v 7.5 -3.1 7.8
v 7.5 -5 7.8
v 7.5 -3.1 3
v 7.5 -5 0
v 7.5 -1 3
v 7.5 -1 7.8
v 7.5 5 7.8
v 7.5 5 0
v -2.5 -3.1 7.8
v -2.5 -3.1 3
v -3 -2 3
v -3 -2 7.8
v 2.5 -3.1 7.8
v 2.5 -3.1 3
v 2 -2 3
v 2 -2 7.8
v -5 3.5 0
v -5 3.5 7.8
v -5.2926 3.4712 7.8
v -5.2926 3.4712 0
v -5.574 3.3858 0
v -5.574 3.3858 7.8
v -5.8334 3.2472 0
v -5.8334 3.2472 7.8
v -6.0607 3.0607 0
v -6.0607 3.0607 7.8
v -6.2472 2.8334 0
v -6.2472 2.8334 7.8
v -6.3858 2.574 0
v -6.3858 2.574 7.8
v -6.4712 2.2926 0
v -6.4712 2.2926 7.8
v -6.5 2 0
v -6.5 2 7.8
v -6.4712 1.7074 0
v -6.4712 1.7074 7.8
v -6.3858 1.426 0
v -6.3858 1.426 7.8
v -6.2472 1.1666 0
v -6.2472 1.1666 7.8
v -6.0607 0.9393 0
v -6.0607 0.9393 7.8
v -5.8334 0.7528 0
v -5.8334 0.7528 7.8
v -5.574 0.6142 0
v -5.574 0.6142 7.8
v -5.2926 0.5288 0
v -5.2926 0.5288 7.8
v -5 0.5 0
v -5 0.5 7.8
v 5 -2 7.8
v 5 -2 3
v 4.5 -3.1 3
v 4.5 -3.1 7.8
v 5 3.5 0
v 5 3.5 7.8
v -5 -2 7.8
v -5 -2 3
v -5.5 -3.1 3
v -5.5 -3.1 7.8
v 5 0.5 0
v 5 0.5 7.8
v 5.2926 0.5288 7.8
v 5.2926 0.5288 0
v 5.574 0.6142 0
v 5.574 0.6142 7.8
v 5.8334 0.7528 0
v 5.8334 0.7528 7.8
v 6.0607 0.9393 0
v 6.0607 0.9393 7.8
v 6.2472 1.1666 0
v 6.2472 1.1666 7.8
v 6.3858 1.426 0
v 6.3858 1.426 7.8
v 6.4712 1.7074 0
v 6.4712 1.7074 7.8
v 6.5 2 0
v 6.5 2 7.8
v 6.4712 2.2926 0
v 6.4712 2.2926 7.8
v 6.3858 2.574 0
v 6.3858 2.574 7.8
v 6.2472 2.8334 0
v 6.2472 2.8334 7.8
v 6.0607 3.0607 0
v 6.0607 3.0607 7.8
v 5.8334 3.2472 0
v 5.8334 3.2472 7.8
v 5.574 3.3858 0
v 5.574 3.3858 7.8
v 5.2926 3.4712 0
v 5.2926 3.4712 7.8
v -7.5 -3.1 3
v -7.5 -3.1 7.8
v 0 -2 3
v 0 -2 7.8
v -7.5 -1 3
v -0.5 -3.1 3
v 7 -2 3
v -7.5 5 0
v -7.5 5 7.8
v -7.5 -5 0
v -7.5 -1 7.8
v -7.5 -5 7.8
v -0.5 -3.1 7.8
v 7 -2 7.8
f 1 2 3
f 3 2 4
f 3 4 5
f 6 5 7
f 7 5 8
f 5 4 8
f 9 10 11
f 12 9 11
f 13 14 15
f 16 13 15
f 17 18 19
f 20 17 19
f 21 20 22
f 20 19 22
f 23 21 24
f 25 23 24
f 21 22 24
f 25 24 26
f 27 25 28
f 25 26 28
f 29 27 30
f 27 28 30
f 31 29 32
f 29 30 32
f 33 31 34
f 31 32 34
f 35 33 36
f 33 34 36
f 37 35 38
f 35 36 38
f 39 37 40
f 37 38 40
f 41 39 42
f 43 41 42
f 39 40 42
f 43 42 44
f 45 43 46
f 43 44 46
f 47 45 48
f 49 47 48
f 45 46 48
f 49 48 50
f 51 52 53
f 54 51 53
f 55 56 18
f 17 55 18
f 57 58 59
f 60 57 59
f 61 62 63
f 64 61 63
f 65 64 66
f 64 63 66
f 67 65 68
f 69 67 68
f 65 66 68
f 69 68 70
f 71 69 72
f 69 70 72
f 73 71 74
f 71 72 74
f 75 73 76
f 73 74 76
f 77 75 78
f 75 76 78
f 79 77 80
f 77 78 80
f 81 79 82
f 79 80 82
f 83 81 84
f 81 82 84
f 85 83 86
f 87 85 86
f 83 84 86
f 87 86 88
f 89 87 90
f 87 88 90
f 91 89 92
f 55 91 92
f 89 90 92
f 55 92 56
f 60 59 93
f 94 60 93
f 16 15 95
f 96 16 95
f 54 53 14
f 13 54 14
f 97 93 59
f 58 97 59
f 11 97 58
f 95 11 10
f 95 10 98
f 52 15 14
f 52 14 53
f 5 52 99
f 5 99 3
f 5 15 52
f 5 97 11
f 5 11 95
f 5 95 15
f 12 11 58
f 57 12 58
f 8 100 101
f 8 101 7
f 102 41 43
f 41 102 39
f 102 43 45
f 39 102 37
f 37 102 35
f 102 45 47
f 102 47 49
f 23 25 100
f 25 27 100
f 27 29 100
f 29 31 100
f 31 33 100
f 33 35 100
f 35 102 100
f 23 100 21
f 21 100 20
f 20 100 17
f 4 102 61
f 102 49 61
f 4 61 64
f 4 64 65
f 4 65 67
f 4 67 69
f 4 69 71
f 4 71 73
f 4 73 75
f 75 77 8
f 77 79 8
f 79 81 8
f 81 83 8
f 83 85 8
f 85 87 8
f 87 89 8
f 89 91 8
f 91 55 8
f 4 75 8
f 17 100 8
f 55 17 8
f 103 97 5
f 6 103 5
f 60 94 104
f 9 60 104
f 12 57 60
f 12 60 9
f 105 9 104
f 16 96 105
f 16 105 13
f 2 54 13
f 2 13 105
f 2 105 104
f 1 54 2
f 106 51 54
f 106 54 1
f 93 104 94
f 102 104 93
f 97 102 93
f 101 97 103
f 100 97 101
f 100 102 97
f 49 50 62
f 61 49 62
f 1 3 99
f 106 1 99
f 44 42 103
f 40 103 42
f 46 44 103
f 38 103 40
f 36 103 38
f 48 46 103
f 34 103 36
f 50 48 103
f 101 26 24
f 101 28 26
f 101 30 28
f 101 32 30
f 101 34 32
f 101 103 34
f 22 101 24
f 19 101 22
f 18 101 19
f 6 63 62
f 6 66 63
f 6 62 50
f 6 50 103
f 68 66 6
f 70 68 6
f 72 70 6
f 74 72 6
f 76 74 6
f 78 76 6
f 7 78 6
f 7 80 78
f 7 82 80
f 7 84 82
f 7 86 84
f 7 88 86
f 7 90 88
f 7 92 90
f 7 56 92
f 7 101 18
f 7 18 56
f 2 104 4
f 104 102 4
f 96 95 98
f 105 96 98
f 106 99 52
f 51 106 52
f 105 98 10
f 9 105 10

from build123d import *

# Parameters (mm, degrees)
F0_W     = 15
F0_H     = 10
F1_DEPTH = 3
F2_W     = 15
F2_H     = 6
F3_DEPTH = 4.8
F5_DEPTH = 7.801


with BuildPart() as f1:
    # F0 (on Top) → F1 (new body)
    with BuildSketch(Plane.XY):
        Rectangle(F0_W, F0_H)
    extrude(amount=F1_DEPTH)

    # F2 (on face) → F3 (join)
    with BuildSketch(Plane.XY.offset(3)):
        Polygon((2, -2), (0, -2), (-0.5, -3.1), (-2.5, -3.1), (-3, -2), (-5, -2), (-5.5, -3.1), (-7.5, -3.1), (-7.5, -5), (7.5, -5), (7.5, -3.1), (7, -2), (5, -2), (4.5, -3.1), (2.5, -3.1), align=None)
        with Locations((0, 2)):
            Rectangle(F2_W, F2_H)
    extrude(amount=F3_DEPTH)

    # F4 (on face) → F5 (cut, through all)
    with BuildSketch(Plane.XY.offset(7.8)):
        with BuildLine():
            Line((5, 3.5), (-5, 3.5))
            ThreePointArc((-5, 3.5), (-6.5, 2), (-5, 0.5))
            Line((-5, 0.5), (5, 0.5))
            ThreePointArc((5, 0.5), (6.5, 2), (5, 3.5))
        make_face()
    extrude(amount=-F5_DEPTH, mode=Mode.SUBTRACT)


solid = f1.part
